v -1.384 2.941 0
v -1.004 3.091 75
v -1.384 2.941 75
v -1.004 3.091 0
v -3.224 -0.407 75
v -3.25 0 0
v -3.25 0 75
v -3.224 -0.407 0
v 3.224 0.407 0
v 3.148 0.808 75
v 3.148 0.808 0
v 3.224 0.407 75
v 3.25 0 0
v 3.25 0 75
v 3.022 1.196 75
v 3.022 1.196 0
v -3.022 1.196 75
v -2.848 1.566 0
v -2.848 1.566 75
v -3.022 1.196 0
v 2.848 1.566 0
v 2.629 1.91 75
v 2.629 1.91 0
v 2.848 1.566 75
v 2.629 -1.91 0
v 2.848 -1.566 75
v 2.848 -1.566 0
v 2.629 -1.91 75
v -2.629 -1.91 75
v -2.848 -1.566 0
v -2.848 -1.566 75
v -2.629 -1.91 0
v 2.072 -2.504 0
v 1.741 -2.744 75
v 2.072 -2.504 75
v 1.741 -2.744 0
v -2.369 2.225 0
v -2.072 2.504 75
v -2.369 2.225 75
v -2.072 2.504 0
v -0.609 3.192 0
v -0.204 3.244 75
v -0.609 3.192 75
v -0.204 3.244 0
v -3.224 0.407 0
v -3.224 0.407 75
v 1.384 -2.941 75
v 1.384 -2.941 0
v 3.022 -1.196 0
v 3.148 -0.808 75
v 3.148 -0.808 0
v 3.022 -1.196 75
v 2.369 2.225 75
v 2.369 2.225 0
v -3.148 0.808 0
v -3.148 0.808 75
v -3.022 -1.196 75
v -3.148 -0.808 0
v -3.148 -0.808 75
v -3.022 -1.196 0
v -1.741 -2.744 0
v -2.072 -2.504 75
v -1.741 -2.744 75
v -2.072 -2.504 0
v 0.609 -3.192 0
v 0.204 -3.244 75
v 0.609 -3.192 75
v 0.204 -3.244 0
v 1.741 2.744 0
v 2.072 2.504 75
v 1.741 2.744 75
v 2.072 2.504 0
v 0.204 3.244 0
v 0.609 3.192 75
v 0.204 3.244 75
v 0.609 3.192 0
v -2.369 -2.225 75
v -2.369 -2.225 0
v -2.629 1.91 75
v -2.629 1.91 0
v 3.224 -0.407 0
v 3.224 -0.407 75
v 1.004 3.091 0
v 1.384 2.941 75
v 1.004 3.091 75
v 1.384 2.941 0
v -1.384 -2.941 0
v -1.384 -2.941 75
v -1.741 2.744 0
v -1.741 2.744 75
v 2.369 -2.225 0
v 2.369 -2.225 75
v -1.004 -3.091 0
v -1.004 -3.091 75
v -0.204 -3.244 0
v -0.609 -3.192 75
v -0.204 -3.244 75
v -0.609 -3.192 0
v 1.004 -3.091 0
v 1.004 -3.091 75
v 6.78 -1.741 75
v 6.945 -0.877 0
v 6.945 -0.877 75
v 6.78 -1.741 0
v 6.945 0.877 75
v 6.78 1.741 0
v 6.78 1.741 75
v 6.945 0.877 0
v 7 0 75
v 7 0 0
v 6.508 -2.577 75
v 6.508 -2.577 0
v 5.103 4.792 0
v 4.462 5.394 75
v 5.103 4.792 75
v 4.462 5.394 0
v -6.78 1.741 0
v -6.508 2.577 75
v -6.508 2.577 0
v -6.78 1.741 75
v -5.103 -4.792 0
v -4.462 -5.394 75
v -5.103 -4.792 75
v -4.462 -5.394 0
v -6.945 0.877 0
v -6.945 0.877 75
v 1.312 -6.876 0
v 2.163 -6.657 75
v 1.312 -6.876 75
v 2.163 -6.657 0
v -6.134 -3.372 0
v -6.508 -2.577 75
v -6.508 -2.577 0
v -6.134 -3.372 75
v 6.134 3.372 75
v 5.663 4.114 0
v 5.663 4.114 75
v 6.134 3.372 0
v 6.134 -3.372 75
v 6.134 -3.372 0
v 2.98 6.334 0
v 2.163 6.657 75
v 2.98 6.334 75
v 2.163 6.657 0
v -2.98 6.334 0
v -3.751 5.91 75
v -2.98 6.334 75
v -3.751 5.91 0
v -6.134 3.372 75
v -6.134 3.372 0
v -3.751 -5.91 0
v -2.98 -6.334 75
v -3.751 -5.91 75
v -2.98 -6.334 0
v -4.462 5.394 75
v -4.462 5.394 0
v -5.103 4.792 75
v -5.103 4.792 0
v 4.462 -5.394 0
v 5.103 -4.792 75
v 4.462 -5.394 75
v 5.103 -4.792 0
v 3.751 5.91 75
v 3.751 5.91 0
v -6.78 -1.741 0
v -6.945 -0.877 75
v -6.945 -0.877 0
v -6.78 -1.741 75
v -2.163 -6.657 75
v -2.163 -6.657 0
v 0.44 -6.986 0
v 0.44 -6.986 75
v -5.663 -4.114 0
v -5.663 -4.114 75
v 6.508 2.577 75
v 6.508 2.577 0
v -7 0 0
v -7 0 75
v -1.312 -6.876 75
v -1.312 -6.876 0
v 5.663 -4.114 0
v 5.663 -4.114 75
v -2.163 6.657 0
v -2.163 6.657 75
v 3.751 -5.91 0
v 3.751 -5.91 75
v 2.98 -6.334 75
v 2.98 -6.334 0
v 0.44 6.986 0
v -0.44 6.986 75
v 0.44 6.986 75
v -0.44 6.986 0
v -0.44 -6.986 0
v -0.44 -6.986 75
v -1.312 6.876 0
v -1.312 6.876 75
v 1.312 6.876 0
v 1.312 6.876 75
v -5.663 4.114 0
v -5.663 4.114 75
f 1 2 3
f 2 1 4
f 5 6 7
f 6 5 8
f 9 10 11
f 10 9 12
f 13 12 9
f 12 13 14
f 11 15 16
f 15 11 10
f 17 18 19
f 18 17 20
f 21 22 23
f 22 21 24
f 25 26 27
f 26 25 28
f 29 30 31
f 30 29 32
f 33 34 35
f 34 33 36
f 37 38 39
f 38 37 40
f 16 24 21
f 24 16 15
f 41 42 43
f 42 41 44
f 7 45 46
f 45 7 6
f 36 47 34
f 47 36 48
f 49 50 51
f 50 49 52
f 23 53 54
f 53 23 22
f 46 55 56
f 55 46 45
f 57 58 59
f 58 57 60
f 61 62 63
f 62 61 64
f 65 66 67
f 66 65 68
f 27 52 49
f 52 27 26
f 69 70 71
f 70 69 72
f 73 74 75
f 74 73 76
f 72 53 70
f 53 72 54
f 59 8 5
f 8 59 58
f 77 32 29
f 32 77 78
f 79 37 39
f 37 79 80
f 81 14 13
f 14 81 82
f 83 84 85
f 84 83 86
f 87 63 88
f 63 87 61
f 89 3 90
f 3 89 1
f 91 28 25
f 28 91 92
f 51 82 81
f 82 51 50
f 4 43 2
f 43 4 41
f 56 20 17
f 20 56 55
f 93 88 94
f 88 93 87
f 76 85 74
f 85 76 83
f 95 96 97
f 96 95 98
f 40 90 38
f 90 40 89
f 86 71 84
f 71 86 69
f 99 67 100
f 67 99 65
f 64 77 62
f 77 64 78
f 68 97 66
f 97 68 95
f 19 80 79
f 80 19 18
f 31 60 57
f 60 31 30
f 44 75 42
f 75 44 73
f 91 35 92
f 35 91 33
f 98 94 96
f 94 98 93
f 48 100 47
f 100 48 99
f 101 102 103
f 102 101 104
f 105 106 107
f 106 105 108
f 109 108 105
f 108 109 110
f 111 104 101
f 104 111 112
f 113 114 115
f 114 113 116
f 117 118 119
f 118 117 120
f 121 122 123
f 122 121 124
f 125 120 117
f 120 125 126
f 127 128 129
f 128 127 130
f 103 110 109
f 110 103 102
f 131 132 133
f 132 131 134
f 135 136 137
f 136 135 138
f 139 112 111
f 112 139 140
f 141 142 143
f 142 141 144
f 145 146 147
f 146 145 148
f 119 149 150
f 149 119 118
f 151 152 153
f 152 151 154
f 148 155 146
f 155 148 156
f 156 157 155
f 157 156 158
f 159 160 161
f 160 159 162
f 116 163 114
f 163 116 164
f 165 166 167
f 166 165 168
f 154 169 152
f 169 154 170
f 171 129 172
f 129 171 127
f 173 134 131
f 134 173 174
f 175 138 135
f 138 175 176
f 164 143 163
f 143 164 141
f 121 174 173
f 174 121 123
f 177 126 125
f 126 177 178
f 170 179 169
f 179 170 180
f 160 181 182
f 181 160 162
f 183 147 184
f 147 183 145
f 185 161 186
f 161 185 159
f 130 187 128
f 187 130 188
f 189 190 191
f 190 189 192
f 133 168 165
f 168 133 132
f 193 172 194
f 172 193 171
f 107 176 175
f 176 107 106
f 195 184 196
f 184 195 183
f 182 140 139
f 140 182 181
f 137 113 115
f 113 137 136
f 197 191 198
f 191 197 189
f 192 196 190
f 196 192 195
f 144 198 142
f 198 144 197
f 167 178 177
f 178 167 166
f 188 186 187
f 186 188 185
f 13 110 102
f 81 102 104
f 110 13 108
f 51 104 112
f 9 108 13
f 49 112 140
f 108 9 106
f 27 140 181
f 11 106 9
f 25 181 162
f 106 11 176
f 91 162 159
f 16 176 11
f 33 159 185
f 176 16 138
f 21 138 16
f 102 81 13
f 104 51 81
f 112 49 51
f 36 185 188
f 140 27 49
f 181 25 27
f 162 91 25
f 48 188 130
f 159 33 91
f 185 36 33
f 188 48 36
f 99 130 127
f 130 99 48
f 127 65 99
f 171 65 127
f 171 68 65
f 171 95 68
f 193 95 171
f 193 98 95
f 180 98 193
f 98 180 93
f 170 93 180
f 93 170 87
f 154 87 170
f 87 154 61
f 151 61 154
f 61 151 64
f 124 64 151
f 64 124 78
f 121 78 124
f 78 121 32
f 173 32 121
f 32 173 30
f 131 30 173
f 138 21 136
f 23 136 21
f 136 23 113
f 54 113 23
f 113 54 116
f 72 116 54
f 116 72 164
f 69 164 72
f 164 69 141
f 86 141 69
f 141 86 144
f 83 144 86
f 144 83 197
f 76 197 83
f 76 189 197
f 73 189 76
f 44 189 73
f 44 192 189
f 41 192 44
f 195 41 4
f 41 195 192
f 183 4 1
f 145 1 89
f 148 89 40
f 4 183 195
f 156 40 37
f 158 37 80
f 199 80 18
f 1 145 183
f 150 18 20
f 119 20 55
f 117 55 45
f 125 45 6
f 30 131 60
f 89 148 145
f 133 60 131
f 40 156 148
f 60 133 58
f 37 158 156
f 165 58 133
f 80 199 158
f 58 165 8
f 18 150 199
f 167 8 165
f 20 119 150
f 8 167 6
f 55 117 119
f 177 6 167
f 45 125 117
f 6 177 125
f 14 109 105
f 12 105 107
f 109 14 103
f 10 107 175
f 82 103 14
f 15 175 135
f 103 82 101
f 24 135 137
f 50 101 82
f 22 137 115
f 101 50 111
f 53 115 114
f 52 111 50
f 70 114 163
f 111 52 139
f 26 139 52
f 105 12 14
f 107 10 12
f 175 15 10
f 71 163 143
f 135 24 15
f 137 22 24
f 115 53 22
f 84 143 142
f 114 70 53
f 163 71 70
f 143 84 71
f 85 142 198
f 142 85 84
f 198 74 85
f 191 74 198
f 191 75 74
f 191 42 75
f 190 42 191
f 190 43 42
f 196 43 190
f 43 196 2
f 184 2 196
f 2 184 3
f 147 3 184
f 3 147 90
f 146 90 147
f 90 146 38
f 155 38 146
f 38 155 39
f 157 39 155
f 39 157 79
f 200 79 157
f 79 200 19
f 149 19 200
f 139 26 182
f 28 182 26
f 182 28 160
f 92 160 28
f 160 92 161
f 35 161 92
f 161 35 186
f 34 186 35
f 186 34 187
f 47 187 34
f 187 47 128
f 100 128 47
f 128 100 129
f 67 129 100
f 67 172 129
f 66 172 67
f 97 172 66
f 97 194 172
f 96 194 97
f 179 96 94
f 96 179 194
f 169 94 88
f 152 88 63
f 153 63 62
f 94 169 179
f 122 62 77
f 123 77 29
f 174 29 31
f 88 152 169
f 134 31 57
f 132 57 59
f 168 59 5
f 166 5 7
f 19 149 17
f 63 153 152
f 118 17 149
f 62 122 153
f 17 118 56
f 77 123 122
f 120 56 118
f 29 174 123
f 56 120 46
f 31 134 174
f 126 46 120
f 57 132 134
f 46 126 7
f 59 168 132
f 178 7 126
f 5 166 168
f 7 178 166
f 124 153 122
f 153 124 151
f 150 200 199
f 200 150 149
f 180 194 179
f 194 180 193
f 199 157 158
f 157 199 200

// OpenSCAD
$fn = 50;


difference() {
	union() {
		cylinder(h = 75, r = 7.0000000000);
	}
	union() {
		translate(v = [0.0000000000, 0.0000000000, -100.0000000000]) {
			cylinder(h = 200, r = 3.2500000000);
		}
		cylinder(h = 75, r = 1.8000000000);
		cylinder(h = 75, r = 1.8000000000);
		cylinder(h = 75, r = 1.8000000000);
	}
}
